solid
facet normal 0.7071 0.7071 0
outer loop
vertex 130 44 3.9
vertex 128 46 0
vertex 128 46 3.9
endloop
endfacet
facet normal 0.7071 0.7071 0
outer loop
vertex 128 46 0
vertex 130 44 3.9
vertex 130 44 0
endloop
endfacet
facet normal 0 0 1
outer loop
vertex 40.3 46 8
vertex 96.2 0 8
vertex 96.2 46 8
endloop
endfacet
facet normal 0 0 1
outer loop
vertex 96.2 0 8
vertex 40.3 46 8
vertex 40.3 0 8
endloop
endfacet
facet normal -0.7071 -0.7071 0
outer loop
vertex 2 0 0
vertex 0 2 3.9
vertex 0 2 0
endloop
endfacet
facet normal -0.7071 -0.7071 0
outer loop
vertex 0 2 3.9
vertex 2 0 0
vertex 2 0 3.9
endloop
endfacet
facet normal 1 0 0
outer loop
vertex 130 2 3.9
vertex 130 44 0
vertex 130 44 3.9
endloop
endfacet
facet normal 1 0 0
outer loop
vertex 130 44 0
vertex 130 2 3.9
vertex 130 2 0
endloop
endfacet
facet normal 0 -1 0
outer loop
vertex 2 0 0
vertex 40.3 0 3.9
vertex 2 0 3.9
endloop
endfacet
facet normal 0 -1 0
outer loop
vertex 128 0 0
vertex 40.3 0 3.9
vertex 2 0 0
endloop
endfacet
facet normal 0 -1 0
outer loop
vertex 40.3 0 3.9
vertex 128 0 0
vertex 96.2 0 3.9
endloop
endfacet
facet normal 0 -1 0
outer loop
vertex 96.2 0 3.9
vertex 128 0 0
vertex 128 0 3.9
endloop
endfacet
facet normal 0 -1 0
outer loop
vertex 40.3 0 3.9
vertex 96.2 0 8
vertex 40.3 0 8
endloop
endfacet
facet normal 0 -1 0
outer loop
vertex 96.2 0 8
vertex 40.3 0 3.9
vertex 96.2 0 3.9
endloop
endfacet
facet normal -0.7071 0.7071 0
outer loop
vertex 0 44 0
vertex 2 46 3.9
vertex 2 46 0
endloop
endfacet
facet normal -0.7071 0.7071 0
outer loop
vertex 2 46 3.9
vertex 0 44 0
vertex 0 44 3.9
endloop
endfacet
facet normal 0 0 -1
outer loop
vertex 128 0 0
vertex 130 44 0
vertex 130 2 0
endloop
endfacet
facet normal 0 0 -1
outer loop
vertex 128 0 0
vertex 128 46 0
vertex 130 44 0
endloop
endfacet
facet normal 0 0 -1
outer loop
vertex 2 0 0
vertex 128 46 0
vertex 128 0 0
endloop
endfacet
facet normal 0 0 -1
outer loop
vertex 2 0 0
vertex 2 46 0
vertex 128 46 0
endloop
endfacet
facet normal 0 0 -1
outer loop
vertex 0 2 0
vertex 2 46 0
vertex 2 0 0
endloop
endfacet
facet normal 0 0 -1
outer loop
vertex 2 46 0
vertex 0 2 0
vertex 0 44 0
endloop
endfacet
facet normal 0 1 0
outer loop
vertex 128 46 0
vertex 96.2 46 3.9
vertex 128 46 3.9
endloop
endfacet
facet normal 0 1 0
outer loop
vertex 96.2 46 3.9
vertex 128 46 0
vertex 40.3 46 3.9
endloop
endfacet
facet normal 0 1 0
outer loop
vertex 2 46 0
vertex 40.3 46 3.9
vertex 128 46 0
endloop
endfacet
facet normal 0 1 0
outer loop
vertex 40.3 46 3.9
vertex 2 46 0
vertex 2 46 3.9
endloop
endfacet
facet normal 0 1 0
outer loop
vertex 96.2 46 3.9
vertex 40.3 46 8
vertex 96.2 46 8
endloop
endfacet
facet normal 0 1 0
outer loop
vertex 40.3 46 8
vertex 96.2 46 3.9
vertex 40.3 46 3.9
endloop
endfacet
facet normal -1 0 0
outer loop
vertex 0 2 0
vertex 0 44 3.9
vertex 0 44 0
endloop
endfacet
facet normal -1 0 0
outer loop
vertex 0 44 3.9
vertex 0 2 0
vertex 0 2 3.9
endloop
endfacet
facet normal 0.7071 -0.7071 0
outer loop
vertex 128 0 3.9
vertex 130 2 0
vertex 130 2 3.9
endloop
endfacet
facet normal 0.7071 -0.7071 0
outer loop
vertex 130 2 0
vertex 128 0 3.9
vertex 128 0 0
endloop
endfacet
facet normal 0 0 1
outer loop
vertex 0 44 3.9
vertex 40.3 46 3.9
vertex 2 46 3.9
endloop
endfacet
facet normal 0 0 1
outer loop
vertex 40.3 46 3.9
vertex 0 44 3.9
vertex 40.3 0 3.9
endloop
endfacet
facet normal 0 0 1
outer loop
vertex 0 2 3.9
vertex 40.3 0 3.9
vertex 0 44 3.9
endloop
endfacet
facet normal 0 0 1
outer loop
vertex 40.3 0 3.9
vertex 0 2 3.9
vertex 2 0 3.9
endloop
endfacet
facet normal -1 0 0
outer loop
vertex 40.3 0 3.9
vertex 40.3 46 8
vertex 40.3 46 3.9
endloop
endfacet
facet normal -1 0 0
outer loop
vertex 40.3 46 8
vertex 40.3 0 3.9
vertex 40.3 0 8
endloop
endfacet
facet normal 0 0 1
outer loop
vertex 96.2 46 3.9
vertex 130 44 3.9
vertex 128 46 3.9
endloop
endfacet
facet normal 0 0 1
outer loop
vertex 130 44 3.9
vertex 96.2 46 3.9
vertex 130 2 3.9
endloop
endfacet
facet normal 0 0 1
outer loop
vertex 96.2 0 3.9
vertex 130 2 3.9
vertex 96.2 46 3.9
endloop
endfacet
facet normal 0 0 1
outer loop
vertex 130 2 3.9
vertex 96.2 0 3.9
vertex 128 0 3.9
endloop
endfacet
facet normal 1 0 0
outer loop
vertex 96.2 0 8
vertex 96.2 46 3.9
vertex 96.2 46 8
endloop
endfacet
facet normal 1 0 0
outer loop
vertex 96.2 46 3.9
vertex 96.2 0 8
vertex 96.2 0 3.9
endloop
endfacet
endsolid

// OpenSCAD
$fn = 32;

// ----------------------------------------------------------------------
// Stepped bar: centerstep, 130 x 46 x 8/3.9 mm
// ----------------------------------------------------------------------

// --- parameters (mm) ---
bar_l = 130;              // bar length, X
bar_w = 46;               // bar width, Y
plate_t = 8;              // thickness of the thick zone, Z
thin_t = 3.9;             // thickness of the thin zone
corner_c = 2;             // corner chamfer of the bar
step_cut = 4.1;           // material removed from the thin zone
thick_from = 40.3;        // start of the thick middle zone
thick_to = 96.2;          // end of the thick middle zone
depth_1 = 4.1;            // depth of cut 1 from the top face
depth_2 = 4.1;            // depth of cut 2 from the top face

profile = [[2, 0], [128, 0], [130, 2], [130, 44], [128, 46], [2, 46], [0, 44], [0, 2]];  // primary outline, 8 points, counter clockwise
void_1 = [[-1, -1], [40.3, -1], [40.3, 47], [-1, 47]];  // thin left end, 4 points
void_2 = [[96.2, -1], [131, -1], [131, 47], [96.2, 47]];  // thin right end, 4 points

// --- the one profile operation ---
difference() {
  linear_extrude(height = plate_t) polygon(points = profile);
  translate([0, 0, plate_t - depth_1])
    linear_extrude(height = depth_1 + 1) polygon(points = void_1);
  translate([0, 0, plate_t - depth_2])
    linear_extrude(height = depth_2 + 1) polygon(points = void_2);
}
